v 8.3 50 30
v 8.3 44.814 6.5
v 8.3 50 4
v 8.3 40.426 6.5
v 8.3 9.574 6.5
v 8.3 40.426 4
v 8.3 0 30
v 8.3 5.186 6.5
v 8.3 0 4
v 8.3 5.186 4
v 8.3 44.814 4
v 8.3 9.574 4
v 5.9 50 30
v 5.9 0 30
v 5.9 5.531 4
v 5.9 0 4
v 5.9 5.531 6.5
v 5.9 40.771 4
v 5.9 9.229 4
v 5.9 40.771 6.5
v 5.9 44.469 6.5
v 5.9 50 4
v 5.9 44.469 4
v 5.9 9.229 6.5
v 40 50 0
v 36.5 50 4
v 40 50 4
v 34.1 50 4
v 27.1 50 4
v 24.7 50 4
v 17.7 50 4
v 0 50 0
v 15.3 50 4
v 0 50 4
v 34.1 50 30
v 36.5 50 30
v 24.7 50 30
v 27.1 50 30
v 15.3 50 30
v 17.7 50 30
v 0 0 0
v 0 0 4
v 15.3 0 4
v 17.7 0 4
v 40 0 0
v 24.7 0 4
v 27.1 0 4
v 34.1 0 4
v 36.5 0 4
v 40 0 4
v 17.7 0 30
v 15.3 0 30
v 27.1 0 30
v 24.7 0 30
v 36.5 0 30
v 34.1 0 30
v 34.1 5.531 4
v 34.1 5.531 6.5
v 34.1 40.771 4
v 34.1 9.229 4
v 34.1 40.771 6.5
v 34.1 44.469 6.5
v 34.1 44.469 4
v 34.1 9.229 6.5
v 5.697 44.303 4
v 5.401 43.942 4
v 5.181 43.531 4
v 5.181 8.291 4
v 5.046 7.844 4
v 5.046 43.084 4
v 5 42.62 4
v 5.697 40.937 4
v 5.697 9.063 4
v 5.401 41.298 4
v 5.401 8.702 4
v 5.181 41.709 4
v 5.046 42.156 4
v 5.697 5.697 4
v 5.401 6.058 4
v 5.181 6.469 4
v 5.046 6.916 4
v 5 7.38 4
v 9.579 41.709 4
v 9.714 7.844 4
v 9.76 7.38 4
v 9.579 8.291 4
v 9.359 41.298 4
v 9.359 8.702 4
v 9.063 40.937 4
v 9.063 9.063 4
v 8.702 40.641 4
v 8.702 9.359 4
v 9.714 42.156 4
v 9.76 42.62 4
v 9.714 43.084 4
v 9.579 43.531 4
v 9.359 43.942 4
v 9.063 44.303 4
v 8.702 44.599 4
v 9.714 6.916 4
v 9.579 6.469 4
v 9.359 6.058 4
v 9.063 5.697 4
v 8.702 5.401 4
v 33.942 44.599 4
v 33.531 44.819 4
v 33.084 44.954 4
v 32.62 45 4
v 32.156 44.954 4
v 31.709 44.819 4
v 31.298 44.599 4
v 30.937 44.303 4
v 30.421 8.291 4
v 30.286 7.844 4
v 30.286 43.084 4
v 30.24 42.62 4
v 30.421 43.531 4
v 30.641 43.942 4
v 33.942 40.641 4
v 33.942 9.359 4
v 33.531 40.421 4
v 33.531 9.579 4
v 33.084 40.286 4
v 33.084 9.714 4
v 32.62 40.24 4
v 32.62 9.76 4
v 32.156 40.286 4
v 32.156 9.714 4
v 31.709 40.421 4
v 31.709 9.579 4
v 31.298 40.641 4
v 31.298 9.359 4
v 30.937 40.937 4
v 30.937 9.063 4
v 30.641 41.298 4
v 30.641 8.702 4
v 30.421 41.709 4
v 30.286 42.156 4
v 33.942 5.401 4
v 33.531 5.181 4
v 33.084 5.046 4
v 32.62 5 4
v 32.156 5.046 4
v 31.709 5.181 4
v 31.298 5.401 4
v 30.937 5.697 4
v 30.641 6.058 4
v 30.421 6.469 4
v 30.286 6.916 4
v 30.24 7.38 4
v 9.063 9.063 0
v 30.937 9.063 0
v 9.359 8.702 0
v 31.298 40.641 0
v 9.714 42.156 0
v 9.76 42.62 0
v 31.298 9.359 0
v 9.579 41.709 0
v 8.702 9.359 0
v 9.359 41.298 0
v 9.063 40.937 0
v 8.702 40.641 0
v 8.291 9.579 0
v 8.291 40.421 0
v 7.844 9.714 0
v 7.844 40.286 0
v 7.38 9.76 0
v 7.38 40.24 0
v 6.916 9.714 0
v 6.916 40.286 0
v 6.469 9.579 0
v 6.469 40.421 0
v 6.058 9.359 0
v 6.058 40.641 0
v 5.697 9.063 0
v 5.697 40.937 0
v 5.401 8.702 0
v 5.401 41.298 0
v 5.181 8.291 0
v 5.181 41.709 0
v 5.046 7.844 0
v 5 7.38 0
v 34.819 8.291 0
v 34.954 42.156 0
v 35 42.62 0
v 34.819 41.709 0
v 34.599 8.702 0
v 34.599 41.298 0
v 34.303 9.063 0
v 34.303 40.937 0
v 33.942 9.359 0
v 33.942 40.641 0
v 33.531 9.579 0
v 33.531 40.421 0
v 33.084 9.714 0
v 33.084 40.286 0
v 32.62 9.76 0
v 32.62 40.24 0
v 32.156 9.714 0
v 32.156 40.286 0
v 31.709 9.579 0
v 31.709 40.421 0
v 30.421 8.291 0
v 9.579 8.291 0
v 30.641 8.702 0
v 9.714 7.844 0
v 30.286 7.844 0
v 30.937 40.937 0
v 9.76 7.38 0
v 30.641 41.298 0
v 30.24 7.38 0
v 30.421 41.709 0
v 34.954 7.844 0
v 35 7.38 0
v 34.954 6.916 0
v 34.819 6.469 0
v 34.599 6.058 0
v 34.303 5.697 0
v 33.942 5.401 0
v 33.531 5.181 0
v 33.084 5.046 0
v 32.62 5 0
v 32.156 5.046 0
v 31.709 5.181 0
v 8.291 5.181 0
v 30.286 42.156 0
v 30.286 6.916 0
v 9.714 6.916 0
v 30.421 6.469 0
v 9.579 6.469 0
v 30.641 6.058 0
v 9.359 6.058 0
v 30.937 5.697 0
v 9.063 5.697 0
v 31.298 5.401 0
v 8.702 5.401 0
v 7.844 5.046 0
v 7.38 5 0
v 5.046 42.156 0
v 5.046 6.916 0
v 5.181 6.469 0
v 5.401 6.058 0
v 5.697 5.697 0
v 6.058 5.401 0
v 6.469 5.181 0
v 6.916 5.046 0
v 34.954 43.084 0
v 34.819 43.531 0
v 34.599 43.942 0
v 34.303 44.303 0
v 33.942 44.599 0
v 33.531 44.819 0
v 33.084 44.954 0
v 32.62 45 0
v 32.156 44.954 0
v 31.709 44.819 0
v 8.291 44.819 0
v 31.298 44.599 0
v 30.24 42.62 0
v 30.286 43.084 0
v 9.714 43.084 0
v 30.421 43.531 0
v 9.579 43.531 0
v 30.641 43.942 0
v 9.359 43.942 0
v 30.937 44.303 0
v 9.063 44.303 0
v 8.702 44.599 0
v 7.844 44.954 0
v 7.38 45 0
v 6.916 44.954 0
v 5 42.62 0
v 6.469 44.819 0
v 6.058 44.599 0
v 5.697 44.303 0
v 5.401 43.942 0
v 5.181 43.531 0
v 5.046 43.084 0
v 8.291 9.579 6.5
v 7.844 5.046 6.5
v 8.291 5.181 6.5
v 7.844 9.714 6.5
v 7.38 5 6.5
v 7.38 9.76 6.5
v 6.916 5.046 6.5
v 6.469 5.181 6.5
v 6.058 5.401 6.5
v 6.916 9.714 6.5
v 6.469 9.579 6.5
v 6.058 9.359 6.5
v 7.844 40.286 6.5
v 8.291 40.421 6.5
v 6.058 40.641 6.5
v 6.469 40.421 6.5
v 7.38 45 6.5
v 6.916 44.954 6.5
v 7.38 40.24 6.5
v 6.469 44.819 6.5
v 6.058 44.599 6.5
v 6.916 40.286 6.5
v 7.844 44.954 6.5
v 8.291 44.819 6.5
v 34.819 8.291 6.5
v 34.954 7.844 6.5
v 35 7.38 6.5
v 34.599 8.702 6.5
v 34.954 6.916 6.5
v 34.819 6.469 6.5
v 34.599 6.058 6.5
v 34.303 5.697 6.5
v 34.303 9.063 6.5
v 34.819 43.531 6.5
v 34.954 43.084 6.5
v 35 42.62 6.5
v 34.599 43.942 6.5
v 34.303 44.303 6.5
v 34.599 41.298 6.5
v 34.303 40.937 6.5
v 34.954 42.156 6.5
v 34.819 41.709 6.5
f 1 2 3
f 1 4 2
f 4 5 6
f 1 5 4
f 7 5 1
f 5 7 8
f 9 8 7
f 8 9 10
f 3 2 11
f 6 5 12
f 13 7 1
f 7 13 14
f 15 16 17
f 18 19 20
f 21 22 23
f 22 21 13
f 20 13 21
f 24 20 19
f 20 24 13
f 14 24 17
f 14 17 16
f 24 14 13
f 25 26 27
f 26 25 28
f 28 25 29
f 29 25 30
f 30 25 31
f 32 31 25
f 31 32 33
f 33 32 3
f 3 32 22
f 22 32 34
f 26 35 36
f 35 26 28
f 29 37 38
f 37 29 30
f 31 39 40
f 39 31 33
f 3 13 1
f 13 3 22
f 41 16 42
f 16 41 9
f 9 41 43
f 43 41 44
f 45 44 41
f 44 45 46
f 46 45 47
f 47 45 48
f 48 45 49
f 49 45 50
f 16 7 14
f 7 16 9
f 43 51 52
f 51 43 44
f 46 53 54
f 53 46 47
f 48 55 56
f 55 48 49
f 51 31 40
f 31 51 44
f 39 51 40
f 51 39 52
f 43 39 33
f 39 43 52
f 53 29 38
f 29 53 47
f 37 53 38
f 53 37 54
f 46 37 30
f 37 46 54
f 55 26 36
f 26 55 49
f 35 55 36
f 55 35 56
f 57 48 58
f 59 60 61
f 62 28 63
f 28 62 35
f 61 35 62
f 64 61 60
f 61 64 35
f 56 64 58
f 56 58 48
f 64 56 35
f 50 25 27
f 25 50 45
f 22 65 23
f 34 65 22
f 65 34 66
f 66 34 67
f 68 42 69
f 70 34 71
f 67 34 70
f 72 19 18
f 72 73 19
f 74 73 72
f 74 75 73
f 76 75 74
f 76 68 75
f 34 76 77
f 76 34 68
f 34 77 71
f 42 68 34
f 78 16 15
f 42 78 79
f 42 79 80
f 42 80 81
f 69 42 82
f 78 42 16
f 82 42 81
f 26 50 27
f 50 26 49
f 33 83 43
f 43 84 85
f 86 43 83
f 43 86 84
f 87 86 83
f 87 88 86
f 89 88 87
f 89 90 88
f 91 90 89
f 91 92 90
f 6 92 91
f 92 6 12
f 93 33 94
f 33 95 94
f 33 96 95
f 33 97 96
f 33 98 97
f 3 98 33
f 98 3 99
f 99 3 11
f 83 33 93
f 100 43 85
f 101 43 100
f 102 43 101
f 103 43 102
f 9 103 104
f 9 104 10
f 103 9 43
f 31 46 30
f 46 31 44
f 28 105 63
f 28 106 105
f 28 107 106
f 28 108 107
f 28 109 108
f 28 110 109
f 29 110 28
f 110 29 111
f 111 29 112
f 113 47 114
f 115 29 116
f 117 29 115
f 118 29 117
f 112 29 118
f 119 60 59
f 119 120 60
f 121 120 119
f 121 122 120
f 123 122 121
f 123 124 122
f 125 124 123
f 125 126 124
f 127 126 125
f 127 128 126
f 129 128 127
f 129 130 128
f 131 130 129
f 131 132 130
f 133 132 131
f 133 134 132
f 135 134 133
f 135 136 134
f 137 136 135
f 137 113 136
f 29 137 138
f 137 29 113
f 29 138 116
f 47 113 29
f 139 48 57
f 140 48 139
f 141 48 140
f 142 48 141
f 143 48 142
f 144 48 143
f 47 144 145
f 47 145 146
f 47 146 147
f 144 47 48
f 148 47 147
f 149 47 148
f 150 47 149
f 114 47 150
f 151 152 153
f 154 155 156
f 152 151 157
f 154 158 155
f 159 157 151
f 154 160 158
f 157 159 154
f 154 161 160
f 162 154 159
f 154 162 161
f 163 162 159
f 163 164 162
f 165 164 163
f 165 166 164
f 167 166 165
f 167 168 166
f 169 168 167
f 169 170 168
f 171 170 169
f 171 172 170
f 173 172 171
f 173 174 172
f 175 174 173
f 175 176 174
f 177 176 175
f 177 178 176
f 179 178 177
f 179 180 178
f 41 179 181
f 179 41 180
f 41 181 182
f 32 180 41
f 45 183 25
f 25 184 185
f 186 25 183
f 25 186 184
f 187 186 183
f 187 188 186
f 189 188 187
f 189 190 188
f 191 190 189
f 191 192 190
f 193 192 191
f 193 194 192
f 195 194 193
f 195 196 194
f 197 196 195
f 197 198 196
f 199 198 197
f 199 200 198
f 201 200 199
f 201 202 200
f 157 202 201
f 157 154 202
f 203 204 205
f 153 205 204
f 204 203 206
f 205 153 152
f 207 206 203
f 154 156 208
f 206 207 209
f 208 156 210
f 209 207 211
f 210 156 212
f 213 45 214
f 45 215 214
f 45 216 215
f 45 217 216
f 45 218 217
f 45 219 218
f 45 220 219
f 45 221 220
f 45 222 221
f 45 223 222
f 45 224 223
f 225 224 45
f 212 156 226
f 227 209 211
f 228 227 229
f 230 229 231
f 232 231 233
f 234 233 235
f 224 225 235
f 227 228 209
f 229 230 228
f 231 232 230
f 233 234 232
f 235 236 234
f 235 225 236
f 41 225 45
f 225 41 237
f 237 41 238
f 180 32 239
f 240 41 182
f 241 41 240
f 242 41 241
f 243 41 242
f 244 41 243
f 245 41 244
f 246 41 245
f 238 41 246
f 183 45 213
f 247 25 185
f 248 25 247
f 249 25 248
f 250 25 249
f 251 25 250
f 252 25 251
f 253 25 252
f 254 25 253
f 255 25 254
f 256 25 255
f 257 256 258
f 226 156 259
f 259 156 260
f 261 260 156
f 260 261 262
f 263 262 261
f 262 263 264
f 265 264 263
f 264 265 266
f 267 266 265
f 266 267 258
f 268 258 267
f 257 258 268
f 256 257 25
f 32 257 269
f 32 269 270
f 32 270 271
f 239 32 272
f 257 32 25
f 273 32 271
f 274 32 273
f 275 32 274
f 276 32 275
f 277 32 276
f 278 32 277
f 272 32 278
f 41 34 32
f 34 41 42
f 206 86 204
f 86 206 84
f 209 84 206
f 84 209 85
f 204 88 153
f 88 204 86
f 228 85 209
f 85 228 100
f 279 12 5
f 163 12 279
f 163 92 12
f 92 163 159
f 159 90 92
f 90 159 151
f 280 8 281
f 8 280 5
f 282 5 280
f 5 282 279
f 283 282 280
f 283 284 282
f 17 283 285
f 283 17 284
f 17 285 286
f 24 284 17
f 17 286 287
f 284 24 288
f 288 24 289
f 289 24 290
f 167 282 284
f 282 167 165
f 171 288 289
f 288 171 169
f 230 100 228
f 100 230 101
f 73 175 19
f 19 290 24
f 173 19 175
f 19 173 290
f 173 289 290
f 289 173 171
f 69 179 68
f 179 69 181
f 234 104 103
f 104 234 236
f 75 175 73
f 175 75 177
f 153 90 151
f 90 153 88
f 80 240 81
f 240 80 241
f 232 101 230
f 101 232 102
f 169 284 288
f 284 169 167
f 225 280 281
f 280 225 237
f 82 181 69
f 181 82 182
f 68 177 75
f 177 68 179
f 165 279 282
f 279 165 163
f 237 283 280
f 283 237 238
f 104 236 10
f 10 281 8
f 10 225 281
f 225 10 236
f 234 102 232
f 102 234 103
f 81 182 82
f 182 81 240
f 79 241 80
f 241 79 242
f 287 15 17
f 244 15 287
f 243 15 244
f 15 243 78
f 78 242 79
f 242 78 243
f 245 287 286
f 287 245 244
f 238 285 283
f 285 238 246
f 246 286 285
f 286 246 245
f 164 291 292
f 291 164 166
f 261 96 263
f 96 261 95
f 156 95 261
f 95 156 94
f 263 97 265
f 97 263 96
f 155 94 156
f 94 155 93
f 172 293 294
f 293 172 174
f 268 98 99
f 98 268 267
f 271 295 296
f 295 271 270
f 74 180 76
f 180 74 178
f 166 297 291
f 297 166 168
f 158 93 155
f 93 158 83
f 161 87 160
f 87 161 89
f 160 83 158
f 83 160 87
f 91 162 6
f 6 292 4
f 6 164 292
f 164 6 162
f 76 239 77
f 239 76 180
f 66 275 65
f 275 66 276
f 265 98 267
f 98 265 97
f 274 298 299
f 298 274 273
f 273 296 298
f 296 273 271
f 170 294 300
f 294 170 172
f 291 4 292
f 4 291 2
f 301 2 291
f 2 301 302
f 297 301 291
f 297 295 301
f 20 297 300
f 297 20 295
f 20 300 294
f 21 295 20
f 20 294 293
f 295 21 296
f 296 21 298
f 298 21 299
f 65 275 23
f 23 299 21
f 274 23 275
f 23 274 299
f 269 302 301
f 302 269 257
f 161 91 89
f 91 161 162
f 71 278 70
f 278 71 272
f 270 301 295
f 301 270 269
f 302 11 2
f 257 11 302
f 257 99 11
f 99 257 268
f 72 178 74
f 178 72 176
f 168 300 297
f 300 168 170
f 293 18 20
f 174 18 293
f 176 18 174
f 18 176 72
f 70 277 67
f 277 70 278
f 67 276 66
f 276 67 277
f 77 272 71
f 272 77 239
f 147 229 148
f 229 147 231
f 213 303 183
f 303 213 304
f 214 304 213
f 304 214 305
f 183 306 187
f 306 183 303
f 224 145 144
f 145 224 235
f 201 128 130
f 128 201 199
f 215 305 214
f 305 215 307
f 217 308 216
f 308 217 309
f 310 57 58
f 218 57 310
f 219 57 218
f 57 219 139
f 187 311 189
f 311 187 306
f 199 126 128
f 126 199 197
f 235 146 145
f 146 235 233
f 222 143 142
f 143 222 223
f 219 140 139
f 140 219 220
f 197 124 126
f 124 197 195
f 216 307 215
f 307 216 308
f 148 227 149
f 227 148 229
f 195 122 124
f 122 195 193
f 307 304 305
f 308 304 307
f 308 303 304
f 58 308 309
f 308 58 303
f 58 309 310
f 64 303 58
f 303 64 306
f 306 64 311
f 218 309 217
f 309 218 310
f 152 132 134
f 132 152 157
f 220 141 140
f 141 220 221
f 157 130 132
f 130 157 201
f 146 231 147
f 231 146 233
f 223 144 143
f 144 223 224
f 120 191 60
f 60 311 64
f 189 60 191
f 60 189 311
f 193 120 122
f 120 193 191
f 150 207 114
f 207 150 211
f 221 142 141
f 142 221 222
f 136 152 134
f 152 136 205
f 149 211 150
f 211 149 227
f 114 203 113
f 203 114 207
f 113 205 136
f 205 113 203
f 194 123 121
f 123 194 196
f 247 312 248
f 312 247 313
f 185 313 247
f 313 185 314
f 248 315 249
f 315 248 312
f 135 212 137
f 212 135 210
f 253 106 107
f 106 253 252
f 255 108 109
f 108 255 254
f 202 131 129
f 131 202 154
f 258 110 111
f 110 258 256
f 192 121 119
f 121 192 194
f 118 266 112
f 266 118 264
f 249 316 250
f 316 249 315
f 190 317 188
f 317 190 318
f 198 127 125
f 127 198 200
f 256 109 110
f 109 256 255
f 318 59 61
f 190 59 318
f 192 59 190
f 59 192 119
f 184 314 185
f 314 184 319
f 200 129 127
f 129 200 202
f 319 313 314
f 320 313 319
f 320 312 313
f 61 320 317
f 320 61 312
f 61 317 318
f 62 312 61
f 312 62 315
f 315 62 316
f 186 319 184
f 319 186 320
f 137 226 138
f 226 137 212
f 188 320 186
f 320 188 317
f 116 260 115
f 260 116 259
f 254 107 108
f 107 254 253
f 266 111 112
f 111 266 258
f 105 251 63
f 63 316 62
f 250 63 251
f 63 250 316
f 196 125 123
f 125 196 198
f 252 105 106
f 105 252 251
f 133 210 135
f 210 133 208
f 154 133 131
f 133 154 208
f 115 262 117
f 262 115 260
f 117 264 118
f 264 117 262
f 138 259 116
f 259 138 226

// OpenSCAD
$fn = 32;

// ----------------------------------------------------------------------
// Finned heat sink: 40 x 50 mm base, 26 mm fins
// ----------------------------------------------------------------------

// --- parameters (mm) ---
base_w = 40;              // base width
base_d = 50;              // base depth
base_t = 4;               // base thickness
fin_h = 26;               // fin height above the base
holes_d = 4.76;           // fixing holes
hole_x = 12.62;           // hole offset in x
hole_y = 17.62;           // hole offset in y
fin_t = 2.4;              // fin thickness
fin_pitch = 9.4;          // fin pitch
fin_count = 4;            // number of fins
fin_x0 = 5.9;             // first fin offset

difference() {
  union() {
    cube([base_w, base_d, base_t]);
    for (i = [0 : fin_count - 1]) {
      translate([fin_x0 + i * fin_pitch, 0, base_t - 0.5]) cube([fin_t, base_d, fin_h + 0.5]);
    }
  }
  /* fixing holes through the base, 2.5 mm clear on both sides */
  for (hx = [-12.62, 12.62]) {
    for (hy = [-17.62, 17.62]) {
      translate([base_w / 2 + hx, base_d / 2 + hy, -2.5]) cylinder(h = base_t + 5, d = holes_d);
    }
  }
}
